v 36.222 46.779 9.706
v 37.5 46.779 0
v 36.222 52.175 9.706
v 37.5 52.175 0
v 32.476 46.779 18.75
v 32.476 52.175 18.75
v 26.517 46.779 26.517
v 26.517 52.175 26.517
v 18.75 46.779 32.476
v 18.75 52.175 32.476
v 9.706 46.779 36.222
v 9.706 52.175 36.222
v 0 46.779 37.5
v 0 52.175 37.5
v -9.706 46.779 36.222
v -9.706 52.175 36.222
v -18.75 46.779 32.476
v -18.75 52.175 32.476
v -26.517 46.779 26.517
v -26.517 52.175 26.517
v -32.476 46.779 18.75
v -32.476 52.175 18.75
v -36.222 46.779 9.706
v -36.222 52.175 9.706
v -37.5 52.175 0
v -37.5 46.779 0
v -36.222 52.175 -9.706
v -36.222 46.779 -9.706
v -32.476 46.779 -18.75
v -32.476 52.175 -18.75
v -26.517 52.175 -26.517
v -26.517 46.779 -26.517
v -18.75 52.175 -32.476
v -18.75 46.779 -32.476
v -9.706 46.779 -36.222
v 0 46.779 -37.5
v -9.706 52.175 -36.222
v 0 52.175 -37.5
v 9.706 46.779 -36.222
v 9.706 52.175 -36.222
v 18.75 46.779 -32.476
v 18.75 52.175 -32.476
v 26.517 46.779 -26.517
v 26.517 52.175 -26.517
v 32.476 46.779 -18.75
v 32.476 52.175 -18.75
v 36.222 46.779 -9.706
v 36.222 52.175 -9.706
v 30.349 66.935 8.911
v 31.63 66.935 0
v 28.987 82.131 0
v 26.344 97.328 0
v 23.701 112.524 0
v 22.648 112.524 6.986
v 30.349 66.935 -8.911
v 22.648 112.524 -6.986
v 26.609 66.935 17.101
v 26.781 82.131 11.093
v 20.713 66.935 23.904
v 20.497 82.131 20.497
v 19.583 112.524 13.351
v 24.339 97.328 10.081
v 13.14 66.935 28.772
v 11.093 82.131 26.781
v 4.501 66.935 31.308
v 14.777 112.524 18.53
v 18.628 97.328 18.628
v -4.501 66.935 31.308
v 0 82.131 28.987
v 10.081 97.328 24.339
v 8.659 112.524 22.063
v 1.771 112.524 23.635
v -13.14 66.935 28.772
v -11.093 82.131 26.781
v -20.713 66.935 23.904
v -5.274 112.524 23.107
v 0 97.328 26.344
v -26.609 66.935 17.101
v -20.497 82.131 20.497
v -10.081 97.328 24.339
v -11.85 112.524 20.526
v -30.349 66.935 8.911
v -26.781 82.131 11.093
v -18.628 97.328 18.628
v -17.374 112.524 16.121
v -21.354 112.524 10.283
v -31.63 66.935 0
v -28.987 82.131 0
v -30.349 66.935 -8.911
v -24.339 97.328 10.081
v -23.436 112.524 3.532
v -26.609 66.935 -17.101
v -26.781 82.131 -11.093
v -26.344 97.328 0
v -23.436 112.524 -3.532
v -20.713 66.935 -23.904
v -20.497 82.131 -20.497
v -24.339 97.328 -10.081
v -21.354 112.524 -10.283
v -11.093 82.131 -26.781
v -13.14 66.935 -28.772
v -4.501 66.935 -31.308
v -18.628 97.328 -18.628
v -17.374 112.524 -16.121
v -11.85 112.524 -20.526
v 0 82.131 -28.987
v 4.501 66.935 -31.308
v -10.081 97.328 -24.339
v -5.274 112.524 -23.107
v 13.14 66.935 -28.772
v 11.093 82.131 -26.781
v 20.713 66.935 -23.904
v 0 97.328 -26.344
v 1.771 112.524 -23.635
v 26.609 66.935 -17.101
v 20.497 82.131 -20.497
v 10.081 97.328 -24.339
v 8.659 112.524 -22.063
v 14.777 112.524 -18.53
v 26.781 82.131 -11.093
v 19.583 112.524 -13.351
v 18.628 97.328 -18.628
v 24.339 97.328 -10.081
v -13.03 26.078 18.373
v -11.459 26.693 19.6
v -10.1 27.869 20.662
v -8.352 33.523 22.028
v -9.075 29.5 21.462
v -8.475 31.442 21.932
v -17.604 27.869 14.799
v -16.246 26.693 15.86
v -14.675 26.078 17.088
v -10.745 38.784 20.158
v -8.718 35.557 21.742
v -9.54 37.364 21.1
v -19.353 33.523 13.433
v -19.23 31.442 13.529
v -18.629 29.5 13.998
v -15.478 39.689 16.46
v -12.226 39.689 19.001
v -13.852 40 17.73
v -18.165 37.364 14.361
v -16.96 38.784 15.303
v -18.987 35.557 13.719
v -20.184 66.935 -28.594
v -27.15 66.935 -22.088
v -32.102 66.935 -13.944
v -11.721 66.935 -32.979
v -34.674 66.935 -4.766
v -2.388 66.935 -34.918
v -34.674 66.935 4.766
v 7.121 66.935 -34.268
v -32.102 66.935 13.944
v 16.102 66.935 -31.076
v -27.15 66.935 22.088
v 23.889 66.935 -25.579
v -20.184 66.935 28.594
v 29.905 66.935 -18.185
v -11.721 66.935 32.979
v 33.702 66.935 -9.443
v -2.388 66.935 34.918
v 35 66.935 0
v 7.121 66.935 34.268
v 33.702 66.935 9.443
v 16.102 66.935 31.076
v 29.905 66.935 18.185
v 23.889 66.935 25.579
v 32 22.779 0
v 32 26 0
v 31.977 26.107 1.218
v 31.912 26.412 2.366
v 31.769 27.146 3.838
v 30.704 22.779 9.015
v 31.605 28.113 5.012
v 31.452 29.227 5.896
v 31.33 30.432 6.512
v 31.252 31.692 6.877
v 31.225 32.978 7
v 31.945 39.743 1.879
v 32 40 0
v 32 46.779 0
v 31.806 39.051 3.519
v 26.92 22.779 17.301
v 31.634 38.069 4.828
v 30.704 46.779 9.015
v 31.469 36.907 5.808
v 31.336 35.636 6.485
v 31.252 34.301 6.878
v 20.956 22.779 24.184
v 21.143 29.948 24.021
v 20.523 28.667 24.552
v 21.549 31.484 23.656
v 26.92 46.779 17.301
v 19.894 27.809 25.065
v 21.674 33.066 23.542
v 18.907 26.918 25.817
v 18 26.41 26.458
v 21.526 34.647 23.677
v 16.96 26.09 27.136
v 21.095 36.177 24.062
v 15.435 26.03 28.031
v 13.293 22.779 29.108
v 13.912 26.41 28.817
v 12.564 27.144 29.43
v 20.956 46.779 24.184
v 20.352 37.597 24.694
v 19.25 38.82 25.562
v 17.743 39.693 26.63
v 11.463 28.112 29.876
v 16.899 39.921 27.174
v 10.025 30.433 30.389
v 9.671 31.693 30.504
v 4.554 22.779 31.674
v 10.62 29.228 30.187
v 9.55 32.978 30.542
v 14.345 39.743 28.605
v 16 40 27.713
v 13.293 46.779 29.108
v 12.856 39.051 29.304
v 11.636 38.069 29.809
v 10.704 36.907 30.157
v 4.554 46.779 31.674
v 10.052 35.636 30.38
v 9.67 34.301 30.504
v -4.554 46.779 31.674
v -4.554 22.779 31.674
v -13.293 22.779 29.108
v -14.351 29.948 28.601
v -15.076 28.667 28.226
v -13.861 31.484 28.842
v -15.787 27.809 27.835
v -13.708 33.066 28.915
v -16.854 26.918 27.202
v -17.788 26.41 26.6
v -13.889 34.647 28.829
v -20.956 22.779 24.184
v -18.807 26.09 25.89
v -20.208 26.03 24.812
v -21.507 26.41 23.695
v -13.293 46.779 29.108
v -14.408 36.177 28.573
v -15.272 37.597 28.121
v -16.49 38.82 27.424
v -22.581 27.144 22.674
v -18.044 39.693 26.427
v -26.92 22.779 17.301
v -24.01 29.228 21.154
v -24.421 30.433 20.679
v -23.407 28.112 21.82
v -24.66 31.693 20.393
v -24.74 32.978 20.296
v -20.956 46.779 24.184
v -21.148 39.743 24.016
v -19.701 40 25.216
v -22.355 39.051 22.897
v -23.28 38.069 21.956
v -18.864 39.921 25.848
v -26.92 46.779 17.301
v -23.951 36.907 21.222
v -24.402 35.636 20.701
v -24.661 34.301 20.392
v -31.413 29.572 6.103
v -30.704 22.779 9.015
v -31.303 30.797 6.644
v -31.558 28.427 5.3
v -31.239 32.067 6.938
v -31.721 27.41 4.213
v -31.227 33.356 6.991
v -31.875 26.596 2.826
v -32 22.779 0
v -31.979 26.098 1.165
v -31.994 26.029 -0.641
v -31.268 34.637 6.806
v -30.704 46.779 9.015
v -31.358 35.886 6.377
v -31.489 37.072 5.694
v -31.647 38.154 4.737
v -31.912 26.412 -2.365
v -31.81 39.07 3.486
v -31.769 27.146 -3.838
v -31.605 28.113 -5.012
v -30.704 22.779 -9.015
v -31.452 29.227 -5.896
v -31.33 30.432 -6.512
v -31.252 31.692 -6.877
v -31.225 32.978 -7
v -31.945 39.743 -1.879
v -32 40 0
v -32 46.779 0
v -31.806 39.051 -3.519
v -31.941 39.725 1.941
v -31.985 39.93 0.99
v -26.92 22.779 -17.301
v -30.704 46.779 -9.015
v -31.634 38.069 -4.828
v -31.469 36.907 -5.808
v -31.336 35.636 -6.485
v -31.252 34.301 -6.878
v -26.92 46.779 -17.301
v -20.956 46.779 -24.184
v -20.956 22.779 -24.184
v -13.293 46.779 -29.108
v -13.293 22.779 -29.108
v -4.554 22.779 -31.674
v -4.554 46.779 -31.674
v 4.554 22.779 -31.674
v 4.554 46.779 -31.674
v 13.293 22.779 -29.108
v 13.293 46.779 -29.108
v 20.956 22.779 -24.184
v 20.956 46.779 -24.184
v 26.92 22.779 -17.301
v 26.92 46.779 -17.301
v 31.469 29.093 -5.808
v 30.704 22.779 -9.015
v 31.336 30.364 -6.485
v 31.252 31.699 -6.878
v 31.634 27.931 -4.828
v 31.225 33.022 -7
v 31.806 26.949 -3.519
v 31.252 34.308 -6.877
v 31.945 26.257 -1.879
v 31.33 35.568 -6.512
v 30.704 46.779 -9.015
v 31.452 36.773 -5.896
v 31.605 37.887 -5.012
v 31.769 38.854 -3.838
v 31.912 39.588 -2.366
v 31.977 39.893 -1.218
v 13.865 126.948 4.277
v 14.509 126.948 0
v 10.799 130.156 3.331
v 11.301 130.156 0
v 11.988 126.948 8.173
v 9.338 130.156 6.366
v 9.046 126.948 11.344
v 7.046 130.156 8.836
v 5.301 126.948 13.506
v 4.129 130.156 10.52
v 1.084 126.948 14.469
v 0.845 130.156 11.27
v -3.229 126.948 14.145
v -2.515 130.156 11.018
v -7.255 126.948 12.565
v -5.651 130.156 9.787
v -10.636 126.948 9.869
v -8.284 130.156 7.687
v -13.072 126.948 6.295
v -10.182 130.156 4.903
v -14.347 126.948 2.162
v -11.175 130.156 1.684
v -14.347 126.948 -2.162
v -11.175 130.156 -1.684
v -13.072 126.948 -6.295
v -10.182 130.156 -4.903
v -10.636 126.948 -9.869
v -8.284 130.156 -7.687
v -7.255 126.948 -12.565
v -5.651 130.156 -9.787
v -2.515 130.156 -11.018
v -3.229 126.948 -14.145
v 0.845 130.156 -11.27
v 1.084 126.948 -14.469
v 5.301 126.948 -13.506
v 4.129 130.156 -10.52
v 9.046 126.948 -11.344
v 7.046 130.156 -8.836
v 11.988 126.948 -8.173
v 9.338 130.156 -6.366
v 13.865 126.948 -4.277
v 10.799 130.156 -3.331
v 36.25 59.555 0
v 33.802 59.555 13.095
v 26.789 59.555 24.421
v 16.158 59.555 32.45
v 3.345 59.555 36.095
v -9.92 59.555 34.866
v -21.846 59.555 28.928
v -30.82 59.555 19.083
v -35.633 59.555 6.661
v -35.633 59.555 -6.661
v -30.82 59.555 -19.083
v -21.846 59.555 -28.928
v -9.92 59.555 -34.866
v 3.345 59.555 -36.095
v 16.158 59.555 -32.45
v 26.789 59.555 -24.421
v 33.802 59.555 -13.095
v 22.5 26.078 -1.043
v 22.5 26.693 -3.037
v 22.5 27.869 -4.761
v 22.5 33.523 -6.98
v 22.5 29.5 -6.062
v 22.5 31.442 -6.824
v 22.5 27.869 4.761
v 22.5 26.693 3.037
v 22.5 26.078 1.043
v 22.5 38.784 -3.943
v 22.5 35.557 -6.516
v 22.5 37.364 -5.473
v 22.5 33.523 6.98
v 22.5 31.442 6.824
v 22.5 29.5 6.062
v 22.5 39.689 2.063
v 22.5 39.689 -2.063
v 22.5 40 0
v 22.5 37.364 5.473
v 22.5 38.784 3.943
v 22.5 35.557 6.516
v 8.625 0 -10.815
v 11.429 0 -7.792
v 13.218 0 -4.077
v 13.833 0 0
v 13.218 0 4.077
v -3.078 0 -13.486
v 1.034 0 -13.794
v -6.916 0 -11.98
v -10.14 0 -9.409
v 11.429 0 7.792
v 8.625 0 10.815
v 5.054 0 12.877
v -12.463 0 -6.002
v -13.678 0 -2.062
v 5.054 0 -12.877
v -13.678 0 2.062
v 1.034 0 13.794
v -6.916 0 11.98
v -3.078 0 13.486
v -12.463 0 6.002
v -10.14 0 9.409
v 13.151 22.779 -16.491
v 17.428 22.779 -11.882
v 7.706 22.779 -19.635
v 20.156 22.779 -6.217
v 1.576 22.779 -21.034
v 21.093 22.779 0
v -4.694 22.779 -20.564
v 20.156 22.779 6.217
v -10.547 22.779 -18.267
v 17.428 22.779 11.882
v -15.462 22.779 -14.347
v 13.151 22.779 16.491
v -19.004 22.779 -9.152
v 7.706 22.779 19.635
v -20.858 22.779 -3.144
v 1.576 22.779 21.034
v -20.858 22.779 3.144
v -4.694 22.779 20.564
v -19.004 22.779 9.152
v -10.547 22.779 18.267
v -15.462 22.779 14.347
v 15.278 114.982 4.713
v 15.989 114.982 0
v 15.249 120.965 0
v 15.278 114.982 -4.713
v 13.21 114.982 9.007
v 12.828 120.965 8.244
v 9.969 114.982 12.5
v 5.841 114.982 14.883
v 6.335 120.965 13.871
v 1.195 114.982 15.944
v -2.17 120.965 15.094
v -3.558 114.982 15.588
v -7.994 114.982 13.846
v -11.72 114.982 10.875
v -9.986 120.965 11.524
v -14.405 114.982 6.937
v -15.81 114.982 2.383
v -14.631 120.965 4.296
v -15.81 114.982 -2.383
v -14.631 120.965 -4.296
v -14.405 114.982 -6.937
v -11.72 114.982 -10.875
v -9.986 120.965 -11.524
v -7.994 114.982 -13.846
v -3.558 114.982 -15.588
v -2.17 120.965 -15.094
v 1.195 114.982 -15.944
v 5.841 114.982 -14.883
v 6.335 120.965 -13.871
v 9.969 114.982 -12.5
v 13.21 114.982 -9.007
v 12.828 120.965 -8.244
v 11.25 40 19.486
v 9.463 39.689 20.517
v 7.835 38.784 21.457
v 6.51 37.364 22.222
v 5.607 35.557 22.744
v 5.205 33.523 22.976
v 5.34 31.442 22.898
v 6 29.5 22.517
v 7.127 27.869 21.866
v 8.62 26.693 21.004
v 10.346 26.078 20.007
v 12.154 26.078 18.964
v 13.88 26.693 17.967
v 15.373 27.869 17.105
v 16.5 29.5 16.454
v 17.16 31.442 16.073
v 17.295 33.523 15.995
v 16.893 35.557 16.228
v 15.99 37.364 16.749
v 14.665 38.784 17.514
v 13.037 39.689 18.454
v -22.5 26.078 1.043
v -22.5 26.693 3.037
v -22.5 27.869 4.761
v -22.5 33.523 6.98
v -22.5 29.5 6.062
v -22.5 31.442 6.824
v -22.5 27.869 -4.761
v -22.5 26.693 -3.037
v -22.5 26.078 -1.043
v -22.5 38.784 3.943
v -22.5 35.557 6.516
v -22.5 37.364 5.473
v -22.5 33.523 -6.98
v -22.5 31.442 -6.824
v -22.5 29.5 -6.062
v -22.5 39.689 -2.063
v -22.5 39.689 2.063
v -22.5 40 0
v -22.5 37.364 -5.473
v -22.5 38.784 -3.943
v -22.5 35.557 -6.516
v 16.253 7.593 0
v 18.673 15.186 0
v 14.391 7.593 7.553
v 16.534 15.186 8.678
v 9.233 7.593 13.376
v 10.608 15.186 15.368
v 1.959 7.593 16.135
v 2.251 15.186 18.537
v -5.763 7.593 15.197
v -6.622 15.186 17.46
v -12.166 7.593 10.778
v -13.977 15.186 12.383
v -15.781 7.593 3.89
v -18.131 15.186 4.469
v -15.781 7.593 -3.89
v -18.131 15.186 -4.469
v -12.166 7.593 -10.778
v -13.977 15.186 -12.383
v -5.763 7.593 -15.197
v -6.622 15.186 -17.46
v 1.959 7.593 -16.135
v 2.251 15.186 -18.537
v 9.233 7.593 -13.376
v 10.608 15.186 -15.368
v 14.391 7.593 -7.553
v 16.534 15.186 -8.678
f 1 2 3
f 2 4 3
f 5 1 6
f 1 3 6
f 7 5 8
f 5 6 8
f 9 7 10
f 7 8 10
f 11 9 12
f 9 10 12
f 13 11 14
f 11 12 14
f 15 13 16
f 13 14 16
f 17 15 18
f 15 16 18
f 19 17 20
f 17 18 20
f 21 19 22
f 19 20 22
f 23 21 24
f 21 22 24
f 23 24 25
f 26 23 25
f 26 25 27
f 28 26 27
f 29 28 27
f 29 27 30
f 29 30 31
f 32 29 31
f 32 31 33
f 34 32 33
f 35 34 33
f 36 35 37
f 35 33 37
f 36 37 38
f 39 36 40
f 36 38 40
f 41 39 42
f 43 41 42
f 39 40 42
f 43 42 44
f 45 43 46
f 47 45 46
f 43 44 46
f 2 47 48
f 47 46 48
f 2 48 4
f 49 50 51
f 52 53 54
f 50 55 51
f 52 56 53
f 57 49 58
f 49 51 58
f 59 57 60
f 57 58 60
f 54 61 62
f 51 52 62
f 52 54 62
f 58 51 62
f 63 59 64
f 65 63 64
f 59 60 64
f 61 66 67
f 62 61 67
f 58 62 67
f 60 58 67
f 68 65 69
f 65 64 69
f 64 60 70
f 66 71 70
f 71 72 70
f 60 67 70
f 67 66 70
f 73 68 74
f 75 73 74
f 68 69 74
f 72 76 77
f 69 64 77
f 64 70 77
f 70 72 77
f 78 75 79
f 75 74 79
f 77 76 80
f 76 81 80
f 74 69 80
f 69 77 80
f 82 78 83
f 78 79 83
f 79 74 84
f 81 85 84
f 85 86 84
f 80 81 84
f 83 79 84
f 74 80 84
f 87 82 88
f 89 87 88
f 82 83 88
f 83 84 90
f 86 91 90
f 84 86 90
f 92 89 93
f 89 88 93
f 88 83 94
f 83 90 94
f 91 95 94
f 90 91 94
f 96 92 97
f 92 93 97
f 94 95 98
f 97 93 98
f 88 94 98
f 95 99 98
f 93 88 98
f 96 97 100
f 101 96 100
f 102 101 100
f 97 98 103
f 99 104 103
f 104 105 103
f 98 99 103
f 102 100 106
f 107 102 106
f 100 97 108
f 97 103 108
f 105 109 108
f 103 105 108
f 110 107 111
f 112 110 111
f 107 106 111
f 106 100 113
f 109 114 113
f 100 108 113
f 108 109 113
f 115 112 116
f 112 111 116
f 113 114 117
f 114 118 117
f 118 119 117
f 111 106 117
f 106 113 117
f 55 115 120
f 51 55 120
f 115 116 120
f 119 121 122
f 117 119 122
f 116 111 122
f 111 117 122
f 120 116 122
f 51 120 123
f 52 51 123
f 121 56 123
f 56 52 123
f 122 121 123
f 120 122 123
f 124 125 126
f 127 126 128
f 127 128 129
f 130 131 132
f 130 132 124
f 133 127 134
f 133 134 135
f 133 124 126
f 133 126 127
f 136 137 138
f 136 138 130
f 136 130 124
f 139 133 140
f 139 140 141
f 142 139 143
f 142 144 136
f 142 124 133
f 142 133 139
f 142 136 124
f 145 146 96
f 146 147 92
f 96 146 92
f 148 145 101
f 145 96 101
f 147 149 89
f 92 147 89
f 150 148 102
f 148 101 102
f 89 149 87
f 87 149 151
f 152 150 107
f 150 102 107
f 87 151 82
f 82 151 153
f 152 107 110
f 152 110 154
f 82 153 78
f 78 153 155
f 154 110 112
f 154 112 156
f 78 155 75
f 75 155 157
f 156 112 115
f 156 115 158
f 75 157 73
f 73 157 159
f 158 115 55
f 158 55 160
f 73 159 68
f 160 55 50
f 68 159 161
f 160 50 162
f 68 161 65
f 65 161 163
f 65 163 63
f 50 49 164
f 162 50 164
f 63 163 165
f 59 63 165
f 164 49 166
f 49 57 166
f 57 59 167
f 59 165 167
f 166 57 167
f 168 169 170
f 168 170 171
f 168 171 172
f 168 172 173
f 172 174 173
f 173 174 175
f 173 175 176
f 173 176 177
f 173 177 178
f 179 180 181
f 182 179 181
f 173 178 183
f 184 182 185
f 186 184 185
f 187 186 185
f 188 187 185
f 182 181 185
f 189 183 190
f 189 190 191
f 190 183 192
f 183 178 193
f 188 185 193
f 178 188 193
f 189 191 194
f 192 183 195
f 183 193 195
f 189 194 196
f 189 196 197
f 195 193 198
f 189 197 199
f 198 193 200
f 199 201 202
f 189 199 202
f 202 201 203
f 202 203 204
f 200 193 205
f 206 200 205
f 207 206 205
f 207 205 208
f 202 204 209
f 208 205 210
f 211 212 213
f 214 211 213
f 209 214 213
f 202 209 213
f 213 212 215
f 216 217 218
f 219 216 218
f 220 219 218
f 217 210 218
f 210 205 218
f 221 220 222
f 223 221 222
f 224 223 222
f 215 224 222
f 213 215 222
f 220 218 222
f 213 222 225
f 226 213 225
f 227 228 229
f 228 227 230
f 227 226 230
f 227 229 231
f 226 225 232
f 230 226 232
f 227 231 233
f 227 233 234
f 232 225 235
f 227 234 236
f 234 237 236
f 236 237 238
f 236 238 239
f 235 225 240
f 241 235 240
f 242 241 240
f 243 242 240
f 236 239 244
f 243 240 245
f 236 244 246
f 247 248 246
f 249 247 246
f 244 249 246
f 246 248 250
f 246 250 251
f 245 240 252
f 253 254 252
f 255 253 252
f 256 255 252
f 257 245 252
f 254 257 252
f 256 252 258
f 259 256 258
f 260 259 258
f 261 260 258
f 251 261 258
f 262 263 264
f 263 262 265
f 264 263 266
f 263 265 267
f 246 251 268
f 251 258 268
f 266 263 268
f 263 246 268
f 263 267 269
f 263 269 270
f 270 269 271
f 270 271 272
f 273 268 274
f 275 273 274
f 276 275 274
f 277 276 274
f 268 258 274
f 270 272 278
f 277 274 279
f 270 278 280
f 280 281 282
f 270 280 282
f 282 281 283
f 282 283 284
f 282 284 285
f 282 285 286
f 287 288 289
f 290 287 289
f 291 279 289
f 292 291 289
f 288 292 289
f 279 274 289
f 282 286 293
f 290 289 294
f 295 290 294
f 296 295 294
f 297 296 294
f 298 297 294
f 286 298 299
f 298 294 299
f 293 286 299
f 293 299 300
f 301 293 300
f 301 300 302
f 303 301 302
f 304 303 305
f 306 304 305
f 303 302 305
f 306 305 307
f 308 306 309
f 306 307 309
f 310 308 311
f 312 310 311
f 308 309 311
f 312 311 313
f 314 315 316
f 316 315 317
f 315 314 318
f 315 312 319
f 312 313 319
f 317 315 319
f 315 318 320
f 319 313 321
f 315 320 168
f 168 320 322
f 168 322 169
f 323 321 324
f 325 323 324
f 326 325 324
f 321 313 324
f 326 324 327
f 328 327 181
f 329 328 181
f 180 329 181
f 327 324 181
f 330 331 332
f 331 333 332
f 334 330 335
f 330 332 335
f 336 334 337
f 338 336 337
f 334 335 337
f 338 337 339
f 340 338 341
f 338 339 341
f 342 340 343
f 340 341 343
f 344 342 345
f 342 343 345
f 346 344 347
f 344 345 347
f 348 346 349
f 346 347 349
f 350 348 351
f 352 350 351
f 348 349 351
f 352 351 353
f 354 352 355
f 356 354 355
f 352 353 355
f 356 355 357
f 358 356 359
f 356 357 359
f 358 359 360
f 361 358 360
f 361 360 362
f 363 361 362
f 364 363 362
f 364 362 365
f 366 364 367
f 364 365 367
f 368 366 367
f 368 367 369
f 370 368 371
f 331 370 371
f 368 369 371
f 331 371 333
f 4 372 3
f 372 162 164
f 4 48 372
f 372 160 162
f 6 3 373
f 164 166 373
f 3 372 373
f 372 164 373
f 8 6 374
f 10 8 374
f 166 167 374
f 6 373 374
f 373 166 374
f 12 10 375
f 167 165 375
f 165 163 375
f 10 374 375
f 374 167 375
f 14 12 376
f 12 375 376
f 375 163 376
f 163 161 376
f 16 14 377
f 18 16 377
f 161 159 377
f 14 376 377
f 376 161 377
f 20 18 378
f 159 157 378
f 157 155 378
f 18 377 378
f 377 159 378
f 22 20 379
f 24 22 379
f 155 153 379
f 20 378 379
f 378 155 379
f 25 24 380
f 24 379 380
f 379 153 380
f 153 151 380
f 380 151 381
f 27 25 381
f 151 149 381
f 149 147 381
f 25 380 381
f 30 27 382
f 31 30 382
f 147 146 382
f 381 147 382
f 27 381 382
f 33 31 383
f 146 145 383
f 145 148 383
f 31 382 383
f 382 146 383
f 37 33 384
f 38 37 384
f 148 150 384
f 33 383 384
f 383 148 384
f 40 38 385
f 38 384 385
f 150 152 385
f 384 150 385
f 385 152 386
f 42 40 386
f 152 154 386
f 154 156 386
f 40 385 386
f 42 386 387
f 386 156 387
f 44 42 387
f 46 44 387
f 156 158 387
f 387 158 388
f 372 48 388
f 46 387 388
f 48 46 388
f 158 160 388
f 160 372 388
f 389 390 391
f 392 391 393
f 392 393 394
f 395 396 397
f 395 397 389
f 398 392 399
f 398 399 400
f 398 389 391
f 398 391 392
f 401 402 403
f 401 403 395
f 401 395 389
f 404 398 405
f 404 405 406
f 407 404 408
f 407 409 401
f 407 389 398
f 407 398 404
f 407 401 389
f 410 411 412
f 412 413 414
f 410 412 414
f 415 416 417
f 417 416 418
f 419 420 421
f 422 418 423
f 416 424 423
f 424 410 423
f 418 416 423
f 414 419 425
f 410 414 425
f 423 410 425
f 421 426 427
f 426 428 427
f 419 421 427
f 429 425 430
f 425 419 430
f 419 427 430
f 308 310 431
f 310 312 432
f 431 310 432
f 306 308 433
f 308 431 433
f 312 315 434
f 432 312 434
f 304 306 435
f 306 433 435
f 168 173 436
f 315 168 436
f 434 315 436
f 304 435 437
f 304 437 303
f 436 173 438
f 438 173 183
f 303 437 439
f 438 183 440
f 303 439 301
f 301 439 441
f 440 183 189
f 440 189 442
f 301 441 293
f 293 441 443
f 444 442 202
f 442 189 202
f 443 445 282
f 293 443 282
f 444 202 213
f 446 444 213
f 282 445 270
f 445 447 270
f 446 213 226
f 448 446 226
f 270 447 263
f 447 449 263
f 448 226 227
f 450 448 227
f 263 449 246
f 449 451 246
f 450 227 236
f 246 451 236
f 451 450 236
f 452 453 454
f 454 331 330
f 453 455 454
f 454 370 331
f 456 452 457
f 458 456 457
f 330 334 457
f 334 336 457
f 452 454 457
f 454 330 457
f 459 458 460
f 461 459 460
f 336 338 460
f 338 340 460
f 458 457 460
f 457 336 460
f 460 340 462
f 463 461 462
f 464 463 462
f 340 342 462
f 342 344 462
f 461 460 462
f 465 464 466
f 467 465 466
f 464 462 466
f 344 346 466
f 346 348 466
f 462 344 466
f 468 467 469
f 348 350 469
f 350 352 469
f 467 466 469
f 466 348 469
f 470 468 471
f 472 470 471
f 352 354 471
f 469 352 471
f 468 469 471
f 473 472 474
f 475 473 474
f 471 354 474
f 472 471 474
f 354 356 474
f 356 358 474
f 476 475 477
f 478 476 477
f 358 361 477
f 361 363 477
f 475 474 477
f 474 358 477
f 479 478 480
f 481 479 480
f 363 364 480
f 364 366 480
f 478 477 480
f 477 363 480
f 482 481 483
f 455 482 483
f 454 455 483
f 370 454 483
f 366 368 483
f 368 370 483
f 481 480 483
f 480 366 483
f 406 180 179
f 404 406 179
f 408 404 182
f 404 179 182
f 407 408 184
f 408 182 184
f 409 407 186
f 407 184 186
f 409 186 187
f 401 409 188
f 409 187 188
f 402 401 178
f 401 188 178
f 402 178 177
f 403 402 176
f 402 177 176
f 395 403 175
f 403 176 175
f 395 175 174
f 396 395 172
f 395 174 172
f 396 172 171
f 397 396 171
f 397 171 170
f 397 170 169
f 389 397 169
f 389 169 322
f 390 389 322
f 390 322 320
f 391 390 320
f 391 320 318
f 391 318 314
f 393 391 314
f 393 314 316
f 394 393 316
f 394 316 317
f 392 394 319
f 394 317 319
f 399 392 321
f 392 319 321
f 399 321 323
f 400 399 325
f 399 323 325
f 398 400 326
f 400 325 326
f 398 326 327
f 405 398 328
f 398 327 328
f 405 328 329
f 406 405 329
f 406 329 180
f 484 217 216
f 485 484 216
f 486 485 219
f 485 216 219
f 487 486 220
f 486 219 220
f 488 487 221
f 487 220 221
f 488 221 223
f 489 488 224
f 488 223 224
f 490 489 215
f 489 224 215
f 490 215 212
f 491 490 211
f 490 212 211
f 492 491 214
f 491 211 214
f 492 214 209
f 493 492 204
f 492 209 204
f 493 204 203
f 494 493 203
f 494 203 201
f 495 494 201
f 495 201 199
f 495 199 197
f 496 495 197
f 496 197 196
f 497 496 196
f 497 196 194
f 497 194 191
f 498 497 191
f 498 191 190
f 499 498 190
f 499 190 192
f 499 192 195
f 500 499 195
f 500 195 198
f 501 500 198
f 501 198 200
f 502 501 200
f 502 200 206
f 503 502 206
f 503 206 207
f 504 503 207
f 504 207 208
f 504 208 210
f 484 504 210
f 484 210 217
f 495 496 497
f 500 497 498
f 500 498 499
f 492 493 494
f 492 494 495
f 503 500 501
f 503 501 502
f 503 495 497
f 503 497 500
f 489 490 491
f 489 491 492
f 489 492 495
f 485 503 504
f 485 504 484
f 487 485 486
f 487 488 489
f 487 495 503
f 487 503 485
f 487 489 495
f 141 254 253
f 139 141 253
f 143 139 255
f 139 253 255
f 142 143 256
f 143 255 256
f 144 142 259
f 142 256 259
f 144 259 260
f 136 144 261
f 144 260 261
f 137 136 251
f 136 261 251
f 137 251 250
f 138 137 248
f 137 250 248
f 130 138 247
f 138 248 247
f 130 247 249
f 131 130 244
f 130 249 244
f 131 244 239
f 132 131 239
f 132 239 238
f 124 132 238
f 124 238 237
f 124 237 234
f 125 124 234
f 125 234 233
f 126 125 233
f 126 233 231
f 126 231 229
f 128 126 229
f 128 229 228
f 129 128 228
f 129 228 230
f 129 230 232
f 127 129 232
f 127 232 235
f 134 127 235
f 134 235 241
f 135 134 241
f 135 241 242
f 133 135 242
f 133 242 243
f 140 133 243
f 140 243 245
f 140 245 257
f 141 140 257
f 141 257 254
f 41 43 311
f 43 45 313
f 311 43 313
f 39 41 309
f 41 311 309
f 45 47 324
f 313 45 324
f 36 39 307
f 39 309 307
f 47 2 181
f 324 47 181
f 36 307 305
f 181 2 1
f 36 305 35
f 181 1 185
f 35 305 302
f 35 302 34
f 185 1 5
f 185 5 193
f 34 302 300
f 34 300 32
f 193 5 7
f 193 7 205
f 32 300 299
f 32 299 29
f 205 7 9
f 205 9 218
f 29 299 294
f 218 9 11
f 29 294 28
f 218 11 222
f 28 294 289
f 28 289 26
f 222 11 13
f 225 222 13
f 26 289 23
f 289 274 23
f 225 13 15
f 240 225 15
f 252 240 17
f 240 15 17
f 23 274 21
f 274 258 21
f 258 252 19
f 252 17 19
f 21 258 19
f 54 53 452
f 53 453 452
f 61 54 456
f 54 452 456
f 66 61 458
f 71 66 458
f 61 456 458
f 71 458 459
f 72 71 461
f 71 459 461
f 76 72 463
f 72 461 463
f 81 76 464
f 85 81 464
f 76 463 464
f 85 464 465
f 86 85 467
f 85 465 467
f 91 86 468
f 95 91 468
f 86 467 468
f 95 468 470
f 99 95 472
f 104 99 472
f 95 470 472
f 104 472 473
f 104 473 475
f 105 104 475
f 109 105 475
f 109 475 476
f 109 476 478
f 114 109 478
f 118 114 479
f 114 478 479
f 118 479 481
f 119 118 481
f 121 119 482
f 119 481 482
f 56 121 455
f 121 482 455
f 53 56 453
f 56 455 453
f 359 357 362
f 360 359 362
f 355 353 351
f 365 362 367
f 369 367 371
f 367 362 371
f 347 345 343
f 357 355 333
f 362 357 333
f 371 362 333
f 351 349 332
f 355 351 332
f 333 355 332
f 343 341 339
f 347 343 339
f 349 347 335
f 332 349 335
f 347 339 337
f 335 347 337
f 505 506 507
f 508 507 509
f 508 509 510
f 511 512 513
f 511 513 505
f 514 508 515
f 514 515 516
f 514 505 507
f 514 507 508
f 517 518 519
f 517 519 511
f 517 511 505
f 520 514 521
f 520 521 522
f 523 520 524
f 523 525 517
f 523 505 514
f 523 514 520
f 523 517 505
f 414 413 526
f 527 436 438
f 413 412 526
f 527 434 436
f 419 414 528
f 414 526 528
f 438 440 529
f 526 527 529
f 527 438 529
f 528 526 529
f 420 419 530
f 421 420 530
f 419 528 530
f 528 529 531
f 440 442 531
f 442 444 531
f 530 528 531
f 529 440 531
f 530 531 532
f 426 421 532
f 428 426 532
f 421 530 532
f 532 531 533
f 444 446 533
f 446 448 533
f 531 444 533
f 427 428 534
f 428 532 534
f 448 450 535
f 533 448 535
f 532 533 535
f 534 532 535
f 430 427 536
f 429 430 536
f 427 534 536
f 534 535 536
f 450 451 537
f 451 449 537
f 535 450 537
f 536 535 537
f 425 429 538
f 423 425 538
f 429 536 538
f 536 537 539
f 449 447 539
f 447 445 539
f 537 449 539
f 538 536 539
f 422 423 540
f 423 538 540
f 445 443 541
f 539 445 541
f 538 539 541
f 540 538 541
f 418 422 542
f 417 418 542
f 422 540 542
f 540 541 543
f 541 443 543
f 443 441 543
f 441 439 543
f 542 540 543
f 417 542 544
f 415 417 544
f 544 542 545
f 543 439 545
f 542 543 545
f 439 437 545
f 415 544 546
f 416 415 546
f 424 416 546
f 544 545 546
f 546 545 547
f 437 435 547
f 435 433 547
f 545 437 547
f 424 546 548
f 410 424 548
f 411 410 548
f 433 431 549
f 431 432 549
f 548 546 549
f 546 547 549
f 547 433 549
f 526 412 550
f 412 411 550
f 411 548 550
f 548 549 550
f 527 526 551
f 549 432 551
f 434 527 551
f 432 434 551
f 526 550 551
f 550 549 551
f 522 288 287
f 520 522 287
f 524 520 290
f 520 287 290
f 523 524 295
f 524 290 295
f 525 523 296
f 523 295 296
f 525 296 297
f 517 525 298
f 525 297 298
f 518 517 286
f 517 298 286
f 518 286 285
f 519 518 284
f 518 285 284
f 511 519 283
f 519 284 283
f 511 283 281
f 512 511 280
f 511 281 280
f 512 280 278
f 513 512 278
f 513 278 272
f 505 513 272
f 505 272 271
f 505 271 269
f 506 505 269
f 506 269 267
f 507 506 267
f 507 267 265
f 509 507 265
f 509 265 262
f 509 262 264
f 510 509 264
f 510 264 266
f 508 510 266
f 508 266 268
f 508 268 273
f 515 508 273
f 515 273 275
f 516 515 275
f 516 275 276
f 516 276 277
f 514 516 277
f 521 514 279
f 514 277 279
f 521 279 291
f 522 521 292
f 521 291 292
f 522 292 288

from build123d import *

# Parameters (mm, degrees)
SKETCH_2_R          = 7
CUT_EXTRUDE_1_DEPTH = 15
SKETCH_3_R          = 7
CUT_EXTRUDE_2_DEPTH = 15
SKETCH_4_R          = 7
CUT_EXTRUDE_3_DEPTH = 15
SKETCH_5_R          = 7
CUT_EXTRUDE_4_DEPTH = 15


with BuildPart() as part:
    # Эскиз1 → Повернуть1 (revolve)
    with BuildSketch(Plane.XY):
        Polygon((0, 0), (13.832956578, 0), (21.093288223, 22.779290537), (32, 22.779290537), (32, 46.779290537), (37.5, 46.779290537), (37.5, 52.174655371), (35, 66.934934907), (31.630138236, 66.934934907), (23.700917658, 112.523953152), (15.988556841, 114.982076121), (14.50917162, 126.947847272), (11.301374522, 130.155644371), (0, 130.155644371), align=None)
    revolve(axis=Axis((0, 138.703973398, 0), (0, -1, 0)))

    # Эскиз2 → Вырез-Вытянуть1 (cut)
    with BuildSketch(Plane(origin=(-37.5, 0, 0), x_dir=(0, 1, 0), z_dir=(-1, 0, 0))):
        with Locations((33, 0)):
            Circle(SKETCH_2_R)
    extrude(amount=-CUT_EXTRUDE_1_DEPTH, mode=Mode.SUBTRACT)

    # Эскиз3 → Вырез-Вытянуть2 (cut)
    with BuildSketch(Plane(origin=(18.75, 0, 32.475952642), x_dir=(0, 1, 0), z_dir=(0.5, 0, 0.866025404))):
        with Locations((33, 0)):
            Circle(SKETCH_3_R)
    extrude(amount=-CUT_EXTRUDE_2_DEPTH, mode=Mode.SUBTRACT)

    # Эскиз4 → Вырез-Вытянуть3 (cut)
    with BuildSketch(Plane(origin=(-23.087305325, 0, 29.55040326), x_dir=(0, 1, 0), z_dir=(-0.615661475, 0, 0.788010754))):
        with Locations((33, 0)):
            Circle(SKETCH_4_R)
    extrude(amount=-CUT_EXTRUDE_3_DEPTH, mode=Mode.SUBTRACT)

    # Эскиз5 → Вырез-Вытянуть4 (cut)
    with BuildSketch(Plane.YZ.offset(37.5)):
        with Locations((33, 0)):
            Circle(SKETCH_5_R)
    extrude(amount=-CUT_EXTRUDE_4_DEPTH, mode=Mode.SUBTRACT)


solid = part.part
